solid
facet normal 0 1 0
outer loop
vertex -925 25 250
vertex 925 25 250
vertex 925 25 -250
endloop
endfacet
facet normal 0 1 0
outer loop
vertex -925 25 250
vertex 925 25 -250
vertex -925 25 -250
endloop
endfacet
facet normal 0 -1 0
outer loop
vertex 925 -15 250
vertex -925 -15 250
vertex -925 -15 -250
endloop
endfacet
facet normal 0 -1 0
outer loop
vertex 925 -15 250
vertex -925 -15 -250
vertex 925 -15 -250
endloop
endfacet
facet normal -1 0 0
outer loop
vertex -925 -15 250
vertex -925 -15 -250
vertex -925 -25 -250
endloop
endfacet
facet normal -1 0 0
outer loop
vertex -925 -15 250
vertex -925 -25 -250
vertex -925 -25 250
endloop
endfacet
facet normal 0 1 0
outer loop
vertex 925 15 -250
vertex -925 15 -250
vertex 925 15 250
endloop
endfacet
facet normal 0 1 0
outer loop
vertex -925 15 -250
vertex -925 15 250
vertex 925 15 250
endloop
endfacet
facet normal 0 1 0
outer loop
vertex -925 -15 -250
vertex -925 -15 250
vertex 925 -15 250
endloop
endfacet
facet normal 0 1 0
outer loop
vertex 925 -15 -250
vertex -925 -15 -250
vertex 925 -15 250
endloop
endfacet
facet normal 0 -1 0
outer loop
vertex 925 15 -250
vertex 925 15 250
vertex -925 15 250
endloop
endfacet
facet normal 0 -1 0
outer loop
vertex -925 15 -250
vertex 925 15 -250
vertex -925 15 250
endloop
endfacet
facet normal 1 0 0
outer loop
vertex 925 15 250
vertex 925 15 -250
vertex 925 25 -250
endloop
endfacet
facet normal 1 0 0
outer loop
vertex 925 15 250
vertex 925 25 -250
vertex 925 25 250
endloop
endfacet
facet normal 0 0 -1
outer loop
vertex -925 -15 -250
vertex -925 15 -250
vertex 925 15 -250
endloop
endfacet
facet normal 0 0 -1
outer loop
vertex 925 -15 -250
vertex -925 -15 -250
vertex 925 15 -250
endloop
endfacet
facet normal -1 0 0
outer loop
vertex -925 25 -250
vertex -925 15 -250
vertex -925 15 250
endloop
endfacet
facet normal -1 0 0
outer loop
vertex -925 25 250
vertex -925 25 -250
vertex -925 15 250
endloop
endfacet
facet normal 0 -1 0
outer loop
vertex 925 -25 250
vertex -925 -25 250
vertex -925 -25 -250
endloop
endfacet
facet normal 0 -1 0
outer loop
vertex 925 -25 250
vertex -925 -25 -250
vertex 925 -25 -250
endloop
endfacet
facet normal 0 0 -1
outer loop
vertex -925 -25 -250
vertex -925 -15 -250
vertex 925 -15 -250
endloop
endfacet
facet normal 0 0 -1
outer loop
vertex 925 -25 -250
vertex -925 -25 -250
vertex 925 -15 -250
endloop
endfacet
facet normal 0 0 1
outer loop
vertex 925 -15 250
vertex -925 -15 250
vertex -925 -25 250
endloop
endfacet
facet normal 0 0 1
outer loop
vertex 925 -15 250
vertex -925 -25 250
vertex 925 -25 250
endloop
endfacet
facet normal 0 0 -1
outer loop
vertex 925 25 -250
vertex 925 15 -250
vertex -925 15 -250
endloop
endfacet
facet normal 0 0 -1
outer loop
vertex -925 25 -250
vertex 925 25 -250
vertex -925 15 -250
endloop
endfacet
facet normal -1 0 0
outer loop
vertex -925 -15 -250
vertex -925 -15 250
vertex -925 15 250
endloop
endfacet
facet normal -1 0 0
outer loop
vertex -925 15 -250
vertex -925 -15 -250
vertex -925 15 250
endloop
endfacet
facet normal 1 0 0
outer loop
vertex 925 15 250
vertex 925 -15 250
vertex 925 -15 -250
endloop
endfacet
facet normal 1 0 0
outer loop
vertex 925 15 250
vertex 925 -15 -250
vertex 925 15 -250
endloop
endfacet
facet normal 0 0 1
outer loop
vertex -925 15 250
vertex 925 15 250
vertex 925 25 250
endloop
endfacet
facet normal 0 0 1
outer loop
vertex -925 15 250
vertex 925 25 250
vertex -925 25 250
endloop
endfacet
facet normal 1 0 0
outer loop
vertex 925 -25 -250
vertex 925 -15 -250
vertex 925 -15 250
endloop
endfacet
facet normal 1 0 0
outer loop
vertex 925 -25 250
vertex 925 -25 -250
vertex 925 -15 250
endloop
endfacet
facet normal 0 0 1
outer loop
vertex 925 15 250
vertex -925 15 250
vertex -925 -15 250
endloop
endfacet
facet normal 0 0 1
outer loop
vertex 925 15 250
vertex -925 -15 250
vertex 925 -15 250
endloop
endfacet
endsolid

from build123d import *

# Parameters (mm, degrees)
F0_W     = 1850
F0_H     = 30
F1_DEPTH = 250
F2_W     = 1850
F2_H     = 500
F3_DEPTH = 10
F4_W     = 1850
F4_H     = 500
F5_DEPTH = 10


with BuildPart() as f1:
    # F0 (on Top) → F1 (new body, symmetric)
    with BuildSketch(Plane.XY):
        Rectangle(F0_W, F0_H)
    extrude(amount=F1_DEPTH, both=True)


with BuildPart() as f3:
    # F2 (on face) → F3 (new body)
    with BuildSketch(Plane(origin=(0, 15, 0), x_dir=(-1, 0, 0), z_dir=(0, 1, 0))):
        Rectangle(F2_W, F2_H)
    extrude(amount=F3_DEPTH)


with BuildPart() as f5:
    # F4 (on face) → F5 (new body)
    with BuildSketch(Plane.XZ.offset(15)):
        Rectangle(F4_W, F4_H)
    extrude(amount=F5_DEPTH)


solid = Compound([f1.part, f3.part, f5.part])
